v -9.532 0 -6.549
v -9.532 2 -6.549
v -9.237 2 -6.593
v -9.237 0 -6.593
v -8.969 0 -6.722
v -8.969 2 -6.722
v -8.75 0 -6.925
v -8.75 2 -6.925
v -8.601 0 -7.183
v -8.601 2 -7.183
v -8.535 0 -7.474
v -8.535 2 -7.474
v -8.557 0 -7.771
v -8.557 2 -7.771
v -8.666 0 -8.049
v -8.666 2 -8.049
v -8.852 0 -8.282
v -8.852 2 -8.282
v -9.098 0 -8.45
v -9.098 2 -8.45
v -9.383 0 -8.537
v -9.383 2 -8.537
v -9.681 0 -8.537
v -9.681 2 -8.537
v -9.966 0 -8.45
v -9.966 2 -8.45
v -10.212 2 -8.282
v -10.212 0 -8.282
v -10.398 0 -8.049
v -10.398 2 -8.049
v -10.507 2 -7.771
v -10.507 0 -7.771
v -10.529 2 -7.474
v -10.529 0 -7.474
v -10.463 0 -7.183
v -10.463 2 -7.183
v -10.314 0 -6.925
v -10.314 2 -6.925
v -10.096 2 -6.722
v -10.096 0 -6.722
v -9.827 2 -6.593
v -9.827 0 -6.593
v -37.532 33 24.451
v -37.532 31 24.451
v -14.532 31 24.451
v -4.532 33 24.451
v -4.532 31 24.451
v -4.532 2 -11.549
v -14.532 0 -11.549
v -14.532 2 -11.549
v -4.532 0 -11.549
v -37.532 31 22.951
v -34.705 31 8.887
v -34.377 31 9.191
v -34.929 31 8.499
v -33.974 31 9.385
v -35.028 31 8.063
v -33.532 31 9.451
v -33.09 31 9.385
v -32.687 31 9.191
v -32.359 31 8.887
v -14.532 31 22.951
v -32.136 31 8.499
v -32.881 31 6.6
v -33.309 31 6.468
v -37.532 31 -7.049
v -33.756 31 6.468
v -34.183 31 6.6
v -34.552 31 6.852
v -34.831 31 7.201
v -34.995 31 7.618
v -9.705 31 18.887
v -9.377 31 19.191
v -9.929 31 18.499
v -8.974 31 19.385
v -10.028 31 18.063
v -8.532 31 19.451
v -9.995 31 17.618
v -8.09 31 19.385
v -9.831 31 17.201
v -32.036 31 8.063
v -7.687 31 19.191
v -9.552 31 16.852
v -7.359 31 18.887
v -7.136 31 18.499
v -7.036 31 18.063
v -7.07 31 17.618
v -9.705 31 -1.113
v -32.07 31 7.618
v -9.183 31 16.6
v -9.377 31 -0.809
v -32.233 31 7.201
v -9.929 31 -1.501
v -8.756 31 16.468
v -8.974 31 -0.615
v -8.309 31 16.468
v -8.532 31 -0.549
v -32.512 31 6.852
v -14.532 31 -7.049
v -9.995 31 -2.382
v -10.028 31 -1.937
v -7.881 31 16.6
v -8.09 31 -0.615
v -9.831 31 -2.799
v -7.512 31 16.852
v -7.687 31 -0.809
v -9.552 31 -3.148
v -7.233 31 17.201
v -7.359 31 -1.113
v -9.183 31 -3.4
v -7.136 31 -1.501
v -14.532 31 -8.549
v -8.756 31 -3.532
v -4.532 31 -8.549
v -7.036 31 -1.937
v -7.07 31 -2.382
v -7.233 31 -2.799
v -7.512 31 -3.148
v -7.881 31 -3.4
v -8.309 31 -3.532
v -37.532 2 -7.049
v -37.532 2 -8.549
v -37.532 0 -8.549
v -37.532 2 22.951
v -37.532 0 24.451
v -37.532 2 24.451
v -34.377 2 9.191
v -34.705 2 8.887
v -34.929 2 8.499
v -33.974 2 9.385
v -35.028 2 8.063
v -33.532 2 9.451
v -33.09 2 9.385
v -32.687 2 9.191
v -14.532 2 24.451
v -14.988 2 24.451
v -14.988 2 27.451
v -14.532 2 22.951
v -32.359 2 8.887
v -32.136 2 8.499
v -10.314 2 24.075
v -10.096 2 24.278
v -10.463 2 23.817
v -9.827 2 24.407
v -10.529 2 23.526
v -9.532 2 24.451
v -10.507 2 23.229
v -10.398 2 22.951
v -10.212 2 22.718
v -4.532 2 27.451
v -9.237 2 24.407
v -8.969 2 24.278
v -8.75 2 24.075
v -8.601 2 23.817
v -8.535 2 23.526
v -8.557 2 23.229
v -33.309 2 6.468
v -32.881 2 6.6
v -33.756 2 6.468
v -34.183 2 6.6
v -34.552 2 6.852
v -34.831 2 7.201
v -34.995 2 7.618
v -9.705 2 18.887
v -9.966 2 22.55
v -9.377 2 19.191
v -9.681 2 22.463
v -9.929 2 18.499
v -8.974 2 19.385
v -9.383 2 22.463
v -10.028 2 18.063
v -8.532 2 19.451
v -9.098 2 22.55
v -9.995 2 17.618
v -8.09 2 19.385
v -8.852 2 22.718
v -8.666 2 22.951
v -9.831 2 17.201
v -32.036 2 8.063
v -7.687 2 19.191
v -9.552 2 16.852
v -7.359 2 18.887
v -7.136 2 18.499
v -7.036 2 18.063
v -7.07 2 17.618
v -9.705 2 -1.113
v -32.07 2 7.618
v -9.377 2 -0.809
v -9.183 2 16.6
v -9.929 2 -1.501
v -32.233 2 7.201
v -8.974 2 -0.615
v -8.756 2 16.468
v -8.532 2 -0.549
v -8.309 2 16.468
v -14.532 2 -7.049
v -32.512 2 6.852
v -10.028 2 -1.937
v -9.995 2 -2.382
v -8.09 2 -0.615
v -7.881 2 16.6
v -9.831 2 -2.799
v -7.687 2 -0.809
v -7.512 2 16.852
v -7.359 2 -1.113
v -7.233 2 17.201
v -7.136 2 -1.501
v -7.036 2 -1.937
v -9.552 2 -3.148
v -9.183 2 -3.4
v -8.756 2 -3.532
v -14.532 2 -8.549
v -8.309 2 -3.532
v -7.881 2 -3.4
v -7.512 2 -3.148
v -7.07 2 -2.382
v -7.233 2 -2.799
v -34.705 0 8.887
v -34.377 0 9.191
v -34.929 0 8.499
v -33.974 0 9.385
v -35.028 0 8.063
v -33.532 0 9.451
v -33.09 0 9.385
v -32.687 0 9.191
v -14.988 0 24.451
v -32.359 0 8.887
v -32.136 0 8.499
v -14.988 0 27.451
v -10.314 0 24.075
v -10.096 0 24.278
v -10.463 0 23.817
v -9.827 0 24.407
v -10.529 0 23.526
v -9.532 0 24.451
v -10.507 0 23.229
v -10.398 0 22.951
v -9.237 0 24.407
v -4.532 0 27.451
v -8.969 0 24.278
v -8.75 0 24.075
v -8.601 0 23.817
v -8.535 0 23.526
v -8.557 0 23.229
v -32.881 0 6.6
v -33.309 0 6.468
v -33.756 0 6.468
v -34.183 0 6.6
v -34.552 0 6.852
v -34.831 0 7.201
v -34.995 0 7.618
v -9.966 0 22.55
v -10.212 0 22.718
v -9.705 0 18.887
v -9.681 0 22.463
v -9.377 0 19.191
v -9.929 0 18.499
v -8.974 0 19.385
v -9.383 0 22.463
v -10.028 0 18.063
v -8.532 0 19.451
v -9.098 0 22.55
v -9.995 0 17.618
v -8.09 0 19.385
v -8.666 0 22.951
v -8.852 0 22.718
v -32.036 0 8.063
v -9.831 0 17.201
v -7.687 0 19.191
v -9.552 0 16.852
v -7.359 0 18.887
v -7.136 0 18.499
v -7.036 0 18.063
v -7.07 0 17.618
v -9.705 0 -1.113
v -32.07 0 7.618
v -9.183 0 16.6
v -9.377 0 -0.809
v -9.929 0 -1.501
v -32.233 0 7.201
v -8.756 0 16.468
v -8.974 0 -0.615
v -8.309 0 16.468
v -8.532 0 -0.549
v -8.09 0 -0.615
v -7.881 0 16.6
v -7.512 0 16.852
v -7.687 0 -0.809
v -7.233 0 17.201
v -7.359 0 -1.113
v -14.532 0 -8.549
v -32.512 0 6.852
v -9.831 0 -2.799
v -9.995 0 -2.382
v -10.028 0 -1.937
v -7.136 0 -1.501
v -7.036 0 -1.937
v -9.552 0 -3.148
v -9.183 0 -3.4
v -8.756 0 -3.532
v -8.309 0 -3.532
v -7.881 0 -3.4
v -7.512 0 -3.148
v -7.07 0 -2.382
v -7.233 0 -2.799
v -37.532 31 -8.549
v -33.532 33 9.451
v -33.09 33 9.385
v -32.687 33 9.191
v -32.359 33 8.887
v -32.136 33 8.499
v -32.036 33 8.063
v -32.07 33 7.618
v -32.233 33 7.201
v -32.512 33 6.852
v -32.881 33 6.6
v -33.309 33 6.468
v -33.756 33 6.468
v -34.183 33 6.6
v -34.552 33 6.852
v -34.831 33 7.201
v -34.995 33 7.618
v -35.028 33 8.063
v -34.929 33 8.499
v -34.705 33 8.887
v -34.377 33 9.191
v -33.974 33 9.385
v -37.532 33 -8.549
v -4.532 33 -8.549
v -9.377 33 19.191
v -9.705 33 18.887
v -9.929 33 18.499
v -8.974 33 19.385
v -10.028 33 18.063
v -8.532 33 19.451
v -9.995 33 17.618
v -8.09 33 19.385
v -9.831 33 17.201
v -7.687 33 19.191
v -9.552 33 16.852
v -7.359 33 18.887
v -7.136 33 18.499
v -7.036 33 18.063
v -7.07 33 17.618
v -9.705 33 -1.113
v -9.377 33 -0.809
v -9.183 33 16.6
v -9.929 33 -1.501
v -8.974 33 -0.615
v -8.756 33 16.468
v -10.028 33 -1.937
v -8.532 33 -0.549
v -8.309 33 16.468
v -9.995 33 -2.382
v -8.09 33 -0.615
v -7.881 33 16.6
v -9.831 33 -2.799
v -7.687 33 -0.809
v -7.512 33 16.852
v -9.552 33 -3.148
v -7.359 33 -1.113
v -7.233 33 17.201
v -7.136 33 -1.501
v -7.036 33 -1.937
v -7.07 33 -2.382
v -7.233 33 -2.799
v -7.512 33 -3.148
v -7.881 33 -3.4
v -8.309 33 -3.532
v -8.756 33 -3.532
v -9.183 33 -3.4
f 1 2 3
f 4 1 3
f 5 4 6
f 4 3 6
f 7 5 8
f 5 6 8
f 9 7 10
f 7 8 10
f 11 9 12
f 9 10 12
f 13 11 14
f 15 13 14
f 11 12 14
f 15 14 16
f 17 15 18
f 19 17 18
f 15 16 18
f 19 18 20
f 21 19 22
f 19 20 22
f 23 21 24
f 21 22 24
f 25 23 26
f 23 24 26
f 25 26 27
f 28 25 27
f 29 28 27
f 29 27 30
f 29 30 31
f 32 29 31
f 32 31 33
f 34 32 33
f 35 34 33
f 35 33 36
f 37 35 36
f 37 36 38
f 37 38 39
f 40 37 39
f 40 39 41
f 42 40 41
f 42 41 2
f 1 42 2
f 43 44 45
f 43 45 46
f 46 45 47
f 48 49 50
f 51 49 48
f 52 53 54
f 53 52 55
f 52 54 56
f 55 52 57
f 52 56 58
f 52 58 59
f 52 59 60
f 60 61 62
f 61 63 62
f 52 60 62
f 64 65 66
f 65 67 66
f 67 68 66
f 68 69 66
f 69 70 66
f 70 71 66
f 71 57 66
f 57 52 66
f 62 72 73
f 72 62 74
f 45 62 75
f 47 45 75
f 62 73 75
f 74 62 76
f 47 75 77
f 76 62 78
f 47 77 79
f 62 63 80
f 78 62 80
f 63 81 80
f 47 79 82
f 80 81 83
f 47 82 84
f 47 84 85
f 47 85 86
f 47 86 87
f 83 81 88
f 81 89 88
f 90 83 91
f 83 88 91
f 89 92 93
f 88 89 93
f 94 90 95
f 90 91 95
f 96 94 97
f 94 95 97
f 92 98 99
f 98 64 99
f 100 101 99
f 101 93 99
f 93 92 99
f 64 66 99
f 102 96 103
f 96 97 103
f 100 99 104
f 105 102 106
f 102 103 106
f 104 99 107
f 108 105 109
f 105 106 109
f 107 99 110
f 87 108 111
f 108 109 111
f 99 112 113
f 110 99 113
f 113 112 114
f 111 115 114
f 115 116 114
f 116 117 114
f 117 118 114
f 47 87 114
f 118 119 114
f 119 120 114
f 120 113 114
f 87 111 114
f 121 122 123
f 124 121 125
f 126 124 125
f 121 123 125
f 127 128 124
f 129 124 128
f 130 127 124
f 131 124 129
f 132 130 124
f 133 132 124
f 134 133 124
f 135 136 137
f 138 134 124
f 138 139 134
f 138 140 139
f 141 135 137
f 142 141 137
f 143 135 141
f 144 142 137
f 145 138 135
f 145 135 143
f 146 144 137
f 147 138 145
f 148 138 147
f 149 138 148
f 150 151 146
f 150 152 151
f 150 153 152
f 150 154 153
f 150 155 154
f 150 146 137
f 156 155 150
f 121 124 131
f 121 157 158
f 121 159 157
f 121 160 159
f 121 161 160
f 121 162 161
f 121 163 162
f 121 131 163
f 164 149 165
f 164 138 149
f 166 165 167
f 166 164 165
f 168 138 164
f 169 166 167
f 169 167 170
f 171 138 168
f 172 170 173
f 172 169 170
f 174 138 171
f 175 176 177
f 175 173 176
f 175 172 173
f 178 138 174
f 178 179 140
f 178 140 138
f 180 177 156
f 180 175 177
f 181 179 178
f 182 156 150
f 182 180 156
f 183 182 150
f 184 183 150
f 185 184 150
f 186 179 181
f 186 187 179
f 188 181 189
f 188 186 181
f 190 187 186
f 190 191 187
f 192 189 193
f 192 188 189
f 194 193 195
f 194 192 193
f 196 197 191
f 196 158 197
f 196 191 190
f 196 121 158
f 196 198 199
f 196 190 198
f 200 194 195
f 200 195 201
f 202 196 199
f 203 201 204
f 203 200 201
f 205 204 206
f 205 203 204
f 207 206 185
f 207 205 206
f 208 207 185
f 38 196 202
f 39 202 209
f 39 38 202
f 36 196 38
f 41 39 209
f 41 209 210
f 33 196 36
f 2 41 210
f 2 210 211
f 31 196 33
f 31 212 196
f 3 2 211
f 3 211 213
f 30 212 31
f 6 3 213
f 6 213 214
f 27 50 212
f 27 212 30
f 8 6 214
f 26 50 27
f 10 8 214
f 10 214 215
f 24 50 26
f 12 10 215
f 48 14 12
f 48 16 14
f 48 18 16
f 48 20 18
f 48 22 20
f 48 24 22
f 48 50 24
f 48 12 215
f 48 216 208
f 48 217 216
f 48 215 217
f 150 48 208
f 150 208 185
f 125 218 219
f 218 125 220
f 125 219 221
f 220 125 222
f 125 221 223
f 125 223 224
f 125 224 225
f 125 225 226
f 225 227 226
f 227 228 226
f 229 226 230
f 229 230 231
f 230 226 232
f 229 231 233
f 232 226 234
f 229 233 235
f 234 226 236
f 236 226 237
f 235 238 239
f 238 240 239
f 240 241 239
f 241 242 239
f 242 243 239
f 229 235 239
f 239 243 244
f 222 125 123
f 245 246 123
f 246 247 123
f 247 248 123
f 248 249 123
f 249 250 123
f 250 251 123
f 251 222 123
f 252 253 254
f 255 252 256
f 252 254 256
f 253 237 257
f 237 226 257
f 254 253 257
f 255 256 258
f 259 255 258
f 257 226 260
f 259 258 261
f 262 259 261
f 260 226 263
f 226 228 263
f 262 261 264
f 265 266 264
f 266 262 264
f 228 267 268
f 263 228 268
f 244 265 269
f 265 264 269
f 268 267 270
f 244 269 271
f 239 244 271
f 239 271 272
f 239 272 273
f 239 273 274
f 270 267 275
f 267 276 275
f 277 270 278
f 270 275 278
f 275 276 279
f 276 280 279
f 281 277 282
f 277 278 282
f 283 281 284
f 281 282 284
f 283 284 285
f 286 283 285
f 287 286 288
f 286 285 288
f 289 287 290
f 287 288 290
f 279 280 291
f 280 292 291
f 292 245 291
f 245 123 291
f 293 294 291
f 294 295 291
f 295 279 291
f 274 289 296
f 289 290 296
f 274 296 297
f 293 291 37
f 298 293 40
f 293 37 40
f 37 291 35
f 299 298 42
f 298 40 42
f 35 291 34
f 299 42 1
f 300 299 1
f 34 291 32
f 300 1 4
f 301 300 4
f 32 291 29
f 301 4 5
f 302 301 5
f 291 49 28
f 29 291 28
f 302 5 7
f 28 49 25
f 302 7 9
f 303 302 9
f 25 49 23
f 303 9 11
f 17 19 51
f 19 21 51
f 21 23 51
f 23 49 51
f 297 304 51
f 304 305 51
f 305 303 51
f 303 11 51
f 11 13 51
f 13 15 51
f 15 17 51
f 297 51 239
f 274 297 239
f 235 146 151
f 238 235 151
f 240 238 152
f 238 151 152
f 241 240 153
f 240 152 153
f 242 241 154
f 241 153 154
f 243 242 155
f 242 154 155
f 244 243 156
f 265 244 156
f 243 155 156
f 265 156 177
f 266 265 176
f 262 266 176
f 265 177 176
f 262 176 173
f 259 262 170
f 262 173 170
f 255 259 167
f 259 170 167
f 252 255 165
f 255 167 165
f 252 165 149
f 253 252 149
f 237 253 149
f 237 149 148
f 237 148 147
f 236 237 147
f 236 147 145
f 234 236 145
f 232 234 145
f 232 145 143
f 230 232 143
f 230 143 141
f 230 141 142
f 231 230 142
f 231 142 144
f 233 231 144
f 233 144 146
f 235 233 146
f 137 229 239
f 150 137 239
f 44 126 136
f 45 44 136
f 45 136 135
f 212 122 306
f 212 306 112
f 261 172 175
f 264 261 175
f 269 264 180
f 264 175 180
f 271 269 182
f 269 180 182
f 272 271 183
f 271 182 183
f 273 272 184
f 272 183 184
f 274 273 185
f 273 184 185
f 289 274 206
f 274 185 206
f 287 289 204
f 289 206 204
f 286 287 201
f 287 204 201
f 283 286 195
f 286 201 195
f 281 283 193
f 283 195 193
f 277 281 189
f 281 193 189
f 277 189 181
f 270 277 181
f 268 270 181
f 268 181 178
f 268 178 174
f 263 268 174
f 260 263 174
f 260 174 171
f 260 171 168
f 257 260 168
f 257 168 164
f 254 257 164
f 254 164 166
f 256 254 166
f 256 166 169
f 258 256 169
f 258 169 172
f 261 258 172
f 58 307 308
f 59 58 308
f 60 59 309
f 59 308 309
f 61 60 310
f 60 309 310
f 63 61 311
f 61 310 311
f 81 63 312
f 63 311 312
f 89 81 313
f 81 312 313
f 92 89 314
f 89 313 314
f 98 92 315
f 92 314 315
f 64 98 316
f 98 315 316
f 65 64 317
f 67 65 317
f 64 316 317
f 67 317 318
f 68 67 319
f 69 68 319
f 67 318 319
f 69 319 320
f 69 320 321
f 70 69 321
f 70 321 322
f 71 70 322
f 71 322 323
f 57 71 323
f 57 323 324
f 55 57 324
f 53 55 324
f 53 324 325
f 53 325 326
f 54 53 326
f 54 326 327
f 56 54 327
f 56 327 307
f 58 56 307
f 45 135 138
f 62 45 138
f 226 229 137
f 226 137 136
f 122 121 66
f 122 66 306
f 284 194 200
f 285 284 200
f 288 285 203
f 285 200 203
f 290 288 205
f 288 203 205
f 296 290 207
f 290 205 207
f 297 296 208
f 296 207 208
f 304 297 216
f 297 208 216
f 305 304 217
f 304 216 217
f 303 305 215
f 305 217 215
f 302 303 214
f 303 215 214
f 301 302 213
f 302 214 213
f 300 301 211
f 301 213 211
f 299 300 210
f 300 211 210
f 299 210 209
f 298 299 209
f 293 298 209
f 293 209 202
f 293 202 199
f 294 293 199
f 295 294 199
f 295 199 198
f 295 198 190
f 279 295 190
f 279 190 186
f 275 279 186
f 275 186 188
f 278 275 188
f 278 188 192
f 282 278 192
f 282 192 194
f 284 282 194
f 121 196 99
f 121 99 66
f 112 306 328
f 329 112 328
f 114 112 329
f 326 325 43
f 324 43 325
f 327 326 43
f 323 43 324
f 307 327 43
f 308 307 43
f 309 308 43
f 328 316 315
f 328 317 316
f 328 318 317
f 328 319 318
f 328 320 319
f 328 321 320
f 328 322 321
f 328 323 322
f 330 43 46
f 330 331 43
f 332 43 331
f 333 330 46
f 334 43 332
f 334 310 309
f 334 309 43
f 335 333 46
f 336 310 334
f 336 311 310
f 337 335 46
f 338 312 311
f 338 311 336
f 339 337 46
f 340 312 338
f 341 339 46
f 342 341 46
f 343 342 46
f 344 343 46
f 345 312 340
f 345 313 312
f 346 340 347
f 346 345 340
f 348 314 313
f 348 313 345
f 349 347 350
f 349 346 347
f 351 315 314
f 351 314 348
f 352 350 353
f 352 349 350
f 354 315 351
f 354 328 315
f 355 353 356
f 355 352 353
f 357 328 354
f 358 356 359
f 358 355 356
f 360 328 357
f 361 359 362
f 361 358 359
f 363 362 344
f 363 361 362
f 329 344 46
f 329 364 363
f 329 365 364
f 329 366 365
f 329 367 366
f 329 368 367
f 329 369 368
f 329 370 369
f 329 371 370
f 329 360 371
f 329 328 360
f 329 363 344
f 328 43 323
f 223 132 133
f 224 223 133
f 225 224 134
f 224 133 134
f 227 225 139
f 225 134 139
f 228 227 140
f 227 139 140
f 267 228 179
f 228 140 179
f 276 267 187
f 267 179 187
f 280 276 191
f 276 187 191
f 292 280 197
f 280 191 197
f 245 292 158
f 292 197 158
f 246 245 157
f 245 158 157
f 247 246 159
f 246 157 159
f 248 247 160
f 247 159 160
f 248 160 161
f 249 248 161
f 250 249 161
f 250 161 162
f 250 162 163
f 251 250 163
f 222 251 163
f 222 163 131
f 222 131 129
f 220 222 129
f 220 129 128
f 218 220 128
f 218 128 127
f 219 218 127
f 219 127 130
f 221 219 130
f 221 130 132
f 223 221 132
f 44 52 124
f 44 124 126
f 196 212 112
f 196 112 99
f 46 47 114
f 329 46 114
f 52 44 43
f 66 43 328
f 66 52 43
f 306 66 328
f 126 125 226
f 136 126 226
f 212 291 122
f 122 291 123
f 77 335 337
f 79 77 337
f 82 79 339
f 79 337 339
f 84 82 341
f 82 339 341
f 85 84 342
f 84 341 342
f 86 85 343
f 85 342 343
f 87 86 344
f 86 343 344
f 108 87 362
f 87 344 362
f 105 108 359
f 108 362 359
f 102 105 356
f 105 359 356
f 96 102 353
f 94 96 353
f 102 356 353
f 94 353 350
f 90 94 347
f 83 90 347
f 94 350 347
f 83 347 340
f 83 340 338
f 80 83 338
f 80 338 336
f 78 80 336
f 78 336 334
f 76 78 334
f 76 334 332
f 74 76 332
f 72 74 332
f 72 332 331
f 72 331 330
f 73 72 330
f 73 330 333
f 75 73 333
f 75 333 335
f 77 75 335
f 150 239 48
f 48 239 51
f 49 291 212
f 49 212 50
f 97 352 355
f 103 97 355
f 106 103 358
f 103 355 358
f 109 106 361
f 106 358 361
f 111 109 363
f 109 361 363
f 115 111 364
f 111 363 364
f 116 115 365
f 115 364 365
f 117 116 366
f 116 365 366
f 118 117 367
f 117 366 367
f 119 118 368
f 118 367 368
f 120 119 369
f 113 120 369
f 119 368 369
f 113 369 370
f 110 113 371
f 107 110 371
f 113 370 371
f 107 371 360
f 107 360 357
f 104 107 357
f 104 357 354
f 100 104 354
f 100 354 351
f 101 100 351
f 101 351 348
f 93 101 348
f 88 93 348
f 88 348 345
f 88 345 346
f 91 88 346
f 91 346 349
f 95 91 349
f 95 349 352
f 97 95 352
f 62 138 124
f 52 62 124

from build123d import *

# Parameters (mm, degrees)
SKETCH1_W           = 10.455425194
SKETCH1_H           = 3
SKETCH1_W_2         = 10
BOSS_EXTRUDE1_DEPTH = 2
SKETCH2_R           = 1
CUT_EXTRUDE2_DEPTH  = 47.542938032
BOSS_EXTRUDE3_DEPTH = 29
SKETCH3_W           = 33
SKETCH3_H           = 33
BOSS_EXTRUDE4_DEPTH = 2
SKETCH4_R           = 1.5
CUT_EXTRUDE4_DEPTH  = 58.019690289


with BuildPart() as part:
    # Sketch1 → Boss-Extrude1 (new body)
    with BuildSketch(Plane(origin=(0, 0, 0), x_dir=(1, 0, 0), z_dir=(0, 1, 0))):
        Polygon((-37.532221957, -24.451364186), (-14.987647151, -24.451364186), (-4.532221957, -24.451364186), (-4.532221957, 8.548635814), (-14.532221957, 8.548635814), (-37.532221957, 8.548635814), align=None)
        with Locations((-9.759934554, -25.951364186)):
            Rectangle(SKETCH1_W, SKETCH1_H)
        with Locations((-9.532221957, 10.048635814)):
            Rectangle(SKETCH1_W_2, SKETCH1_H)
    extrude(amount=BOSS_EXTRUDE1_DEPTH)

    # Sketch2 → Cut-Extrude2 (cut, through all)
    with BuildSketch(Plane(origin=(0, 2, 0), x_dir=(1, 0, 0), z_dir=(0, 1, 0))):
        with Locations(Location((-9.532221957, 7.548635814, 0), (0, 0, 270))):
            Circle(SKETCH2_R)
        with Locations(Location((-9.532221957, -23.451364186, 0), (0, 0, 270))):
            Circle(SKETCH2_R)
    extrude(amount=-CUT_EXTRUDE2_DEPTH, mode=Mode.SUBTRACT)

    # 3DSketch1 → Boss-Extrude3 (add)
    with BuildSketch(Plane(origin=(-37.532221957, 2, 22.951364186), x_dir=(0.589695128953028, 0, -0.8076259374791475), z_dir=(0, -1, 0))):
        Polygon((0, 0), (-1.211438906, 0.884542693), (12.35154906, 19.459939255), (13.562987966, 18.575396562), align=None)
        Polygon((39.003204997, 0), (37.79176609, 0.884542693), (24.228778124, -17.690853869), (25.440217031, -18.575396562), align=None)
    extrude(amount=-BOSS_EXTRUDE3_DEPTH)

    # Sketch3 → Boss-Extrude4 (add)
    with BuildSketch(Plane(origin=(0, 31, 0), x_dir=(1, 0, 0), z_dir=(0, 1, 0))):
        with Locations((-21.032221957, -7.951364186)):
            Rectangle(SKETCH3_W, SKETCH3_H)
    extrude(amount=BOSS_EXTRUDE4_DEPTH)

    # Sketch4 → Cut-Extrude4 (cut, through all)
    with BuildSketch(Plane(origin=(0, 33, 0), x_dir=(1, 0, 0), z_dir=(0, 1, 0))):
        with Locations(Location((-8.532221957, -17.951364186, 0), (0, 0, 270))):
            Circle(SKETCH4_R)
        with Locations(Location((-8.532221957, 2.048635814, 0), (0, 0, 270))):
            Circle(SKETCH4_R)
        with Locations(Location((-33.532221957, -7.951364186, 0), (0, 0, 270))):
            Circle(SKETCH4_R)
    extrude(amount=-CUT_EXTRUDE4_DEPTH, mode=Mode.SUBTRACT)


solid = part.part
